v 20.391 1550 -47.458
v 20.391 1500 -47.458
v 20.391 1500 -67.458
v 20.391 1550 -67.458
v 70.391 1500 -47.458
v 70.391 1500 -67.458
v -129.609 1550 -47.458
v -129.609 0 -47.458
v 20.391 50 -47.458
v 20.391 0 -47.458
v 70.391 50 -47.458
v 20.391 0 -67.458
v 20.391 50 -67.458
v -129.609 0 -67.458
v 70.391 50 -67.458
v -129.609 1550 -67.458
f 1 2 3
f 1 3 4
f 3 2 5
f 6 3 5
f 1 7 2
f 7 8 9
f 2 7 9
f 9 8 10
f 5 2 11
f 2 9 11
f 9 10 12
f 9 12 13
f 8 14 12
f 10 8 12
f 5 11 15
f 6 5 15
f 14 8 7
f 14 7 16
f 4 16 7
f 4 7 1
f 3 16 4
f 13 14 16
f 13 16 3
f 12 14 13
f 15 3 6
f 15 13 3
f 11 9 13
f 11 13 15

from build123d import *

# Parameters (mm, degrees)
ESBO_O1_W                = 200
ESBO_O1_H                = 20
RESSALTO_EXTRUS_O1_DEPTH = 1550
ESBO_O2_W                = 50
ESBO_O2_H                = 50
CORTE_EXTRUS_O1_DEPTH    = 21
ESBO_O3_W                = 50
ESBO_O3_H                = 50
CORTE_EXTRUS_O2_DEPTH    = 21


with BuildPart() as part:
    # Esboço1 → Ressalto-extrusão1 (new body)
    with BuildSketch(Plane(origin=(0, 0, 0), x_dir=(1, 0, 0), z_dir=(0, 1, 0))):
        with Locations((-29.608938547, 57.458100559)):
            Rectangle(ESBO_O1_W, ESBO_O1_H)
    extrude(amount=RESSALTO_EXTRUS_O1_DEPTH)

    # Esboço2 → Corte-extrusão1 (cut, through all)
    with BuildSketch(Plane.XY.offset(-47.458100559)):
        with Locations((45.391061453, 25)):
            Rectangle(ESBO_O2_W, ESBO_O2_H)
    extrude(amount=-CORTE_EXTRUS_O1_DEPTH, mode=Mode.SUBTRACT)

    # Esboço3 → Corte-extrusão2 (cut, through all)
    with BuildSketch(Plane.XY.offset(-47.458100559)):
        with Locations((45.391061453, 1525)):
            Rectangle(ESBO_O3_W, ESBO_O3_H)
    extrude(amount=-CORTE_EXTRUS_O2_DEPTH, mode=Mode.SUBTRACT)


solid = part.part
